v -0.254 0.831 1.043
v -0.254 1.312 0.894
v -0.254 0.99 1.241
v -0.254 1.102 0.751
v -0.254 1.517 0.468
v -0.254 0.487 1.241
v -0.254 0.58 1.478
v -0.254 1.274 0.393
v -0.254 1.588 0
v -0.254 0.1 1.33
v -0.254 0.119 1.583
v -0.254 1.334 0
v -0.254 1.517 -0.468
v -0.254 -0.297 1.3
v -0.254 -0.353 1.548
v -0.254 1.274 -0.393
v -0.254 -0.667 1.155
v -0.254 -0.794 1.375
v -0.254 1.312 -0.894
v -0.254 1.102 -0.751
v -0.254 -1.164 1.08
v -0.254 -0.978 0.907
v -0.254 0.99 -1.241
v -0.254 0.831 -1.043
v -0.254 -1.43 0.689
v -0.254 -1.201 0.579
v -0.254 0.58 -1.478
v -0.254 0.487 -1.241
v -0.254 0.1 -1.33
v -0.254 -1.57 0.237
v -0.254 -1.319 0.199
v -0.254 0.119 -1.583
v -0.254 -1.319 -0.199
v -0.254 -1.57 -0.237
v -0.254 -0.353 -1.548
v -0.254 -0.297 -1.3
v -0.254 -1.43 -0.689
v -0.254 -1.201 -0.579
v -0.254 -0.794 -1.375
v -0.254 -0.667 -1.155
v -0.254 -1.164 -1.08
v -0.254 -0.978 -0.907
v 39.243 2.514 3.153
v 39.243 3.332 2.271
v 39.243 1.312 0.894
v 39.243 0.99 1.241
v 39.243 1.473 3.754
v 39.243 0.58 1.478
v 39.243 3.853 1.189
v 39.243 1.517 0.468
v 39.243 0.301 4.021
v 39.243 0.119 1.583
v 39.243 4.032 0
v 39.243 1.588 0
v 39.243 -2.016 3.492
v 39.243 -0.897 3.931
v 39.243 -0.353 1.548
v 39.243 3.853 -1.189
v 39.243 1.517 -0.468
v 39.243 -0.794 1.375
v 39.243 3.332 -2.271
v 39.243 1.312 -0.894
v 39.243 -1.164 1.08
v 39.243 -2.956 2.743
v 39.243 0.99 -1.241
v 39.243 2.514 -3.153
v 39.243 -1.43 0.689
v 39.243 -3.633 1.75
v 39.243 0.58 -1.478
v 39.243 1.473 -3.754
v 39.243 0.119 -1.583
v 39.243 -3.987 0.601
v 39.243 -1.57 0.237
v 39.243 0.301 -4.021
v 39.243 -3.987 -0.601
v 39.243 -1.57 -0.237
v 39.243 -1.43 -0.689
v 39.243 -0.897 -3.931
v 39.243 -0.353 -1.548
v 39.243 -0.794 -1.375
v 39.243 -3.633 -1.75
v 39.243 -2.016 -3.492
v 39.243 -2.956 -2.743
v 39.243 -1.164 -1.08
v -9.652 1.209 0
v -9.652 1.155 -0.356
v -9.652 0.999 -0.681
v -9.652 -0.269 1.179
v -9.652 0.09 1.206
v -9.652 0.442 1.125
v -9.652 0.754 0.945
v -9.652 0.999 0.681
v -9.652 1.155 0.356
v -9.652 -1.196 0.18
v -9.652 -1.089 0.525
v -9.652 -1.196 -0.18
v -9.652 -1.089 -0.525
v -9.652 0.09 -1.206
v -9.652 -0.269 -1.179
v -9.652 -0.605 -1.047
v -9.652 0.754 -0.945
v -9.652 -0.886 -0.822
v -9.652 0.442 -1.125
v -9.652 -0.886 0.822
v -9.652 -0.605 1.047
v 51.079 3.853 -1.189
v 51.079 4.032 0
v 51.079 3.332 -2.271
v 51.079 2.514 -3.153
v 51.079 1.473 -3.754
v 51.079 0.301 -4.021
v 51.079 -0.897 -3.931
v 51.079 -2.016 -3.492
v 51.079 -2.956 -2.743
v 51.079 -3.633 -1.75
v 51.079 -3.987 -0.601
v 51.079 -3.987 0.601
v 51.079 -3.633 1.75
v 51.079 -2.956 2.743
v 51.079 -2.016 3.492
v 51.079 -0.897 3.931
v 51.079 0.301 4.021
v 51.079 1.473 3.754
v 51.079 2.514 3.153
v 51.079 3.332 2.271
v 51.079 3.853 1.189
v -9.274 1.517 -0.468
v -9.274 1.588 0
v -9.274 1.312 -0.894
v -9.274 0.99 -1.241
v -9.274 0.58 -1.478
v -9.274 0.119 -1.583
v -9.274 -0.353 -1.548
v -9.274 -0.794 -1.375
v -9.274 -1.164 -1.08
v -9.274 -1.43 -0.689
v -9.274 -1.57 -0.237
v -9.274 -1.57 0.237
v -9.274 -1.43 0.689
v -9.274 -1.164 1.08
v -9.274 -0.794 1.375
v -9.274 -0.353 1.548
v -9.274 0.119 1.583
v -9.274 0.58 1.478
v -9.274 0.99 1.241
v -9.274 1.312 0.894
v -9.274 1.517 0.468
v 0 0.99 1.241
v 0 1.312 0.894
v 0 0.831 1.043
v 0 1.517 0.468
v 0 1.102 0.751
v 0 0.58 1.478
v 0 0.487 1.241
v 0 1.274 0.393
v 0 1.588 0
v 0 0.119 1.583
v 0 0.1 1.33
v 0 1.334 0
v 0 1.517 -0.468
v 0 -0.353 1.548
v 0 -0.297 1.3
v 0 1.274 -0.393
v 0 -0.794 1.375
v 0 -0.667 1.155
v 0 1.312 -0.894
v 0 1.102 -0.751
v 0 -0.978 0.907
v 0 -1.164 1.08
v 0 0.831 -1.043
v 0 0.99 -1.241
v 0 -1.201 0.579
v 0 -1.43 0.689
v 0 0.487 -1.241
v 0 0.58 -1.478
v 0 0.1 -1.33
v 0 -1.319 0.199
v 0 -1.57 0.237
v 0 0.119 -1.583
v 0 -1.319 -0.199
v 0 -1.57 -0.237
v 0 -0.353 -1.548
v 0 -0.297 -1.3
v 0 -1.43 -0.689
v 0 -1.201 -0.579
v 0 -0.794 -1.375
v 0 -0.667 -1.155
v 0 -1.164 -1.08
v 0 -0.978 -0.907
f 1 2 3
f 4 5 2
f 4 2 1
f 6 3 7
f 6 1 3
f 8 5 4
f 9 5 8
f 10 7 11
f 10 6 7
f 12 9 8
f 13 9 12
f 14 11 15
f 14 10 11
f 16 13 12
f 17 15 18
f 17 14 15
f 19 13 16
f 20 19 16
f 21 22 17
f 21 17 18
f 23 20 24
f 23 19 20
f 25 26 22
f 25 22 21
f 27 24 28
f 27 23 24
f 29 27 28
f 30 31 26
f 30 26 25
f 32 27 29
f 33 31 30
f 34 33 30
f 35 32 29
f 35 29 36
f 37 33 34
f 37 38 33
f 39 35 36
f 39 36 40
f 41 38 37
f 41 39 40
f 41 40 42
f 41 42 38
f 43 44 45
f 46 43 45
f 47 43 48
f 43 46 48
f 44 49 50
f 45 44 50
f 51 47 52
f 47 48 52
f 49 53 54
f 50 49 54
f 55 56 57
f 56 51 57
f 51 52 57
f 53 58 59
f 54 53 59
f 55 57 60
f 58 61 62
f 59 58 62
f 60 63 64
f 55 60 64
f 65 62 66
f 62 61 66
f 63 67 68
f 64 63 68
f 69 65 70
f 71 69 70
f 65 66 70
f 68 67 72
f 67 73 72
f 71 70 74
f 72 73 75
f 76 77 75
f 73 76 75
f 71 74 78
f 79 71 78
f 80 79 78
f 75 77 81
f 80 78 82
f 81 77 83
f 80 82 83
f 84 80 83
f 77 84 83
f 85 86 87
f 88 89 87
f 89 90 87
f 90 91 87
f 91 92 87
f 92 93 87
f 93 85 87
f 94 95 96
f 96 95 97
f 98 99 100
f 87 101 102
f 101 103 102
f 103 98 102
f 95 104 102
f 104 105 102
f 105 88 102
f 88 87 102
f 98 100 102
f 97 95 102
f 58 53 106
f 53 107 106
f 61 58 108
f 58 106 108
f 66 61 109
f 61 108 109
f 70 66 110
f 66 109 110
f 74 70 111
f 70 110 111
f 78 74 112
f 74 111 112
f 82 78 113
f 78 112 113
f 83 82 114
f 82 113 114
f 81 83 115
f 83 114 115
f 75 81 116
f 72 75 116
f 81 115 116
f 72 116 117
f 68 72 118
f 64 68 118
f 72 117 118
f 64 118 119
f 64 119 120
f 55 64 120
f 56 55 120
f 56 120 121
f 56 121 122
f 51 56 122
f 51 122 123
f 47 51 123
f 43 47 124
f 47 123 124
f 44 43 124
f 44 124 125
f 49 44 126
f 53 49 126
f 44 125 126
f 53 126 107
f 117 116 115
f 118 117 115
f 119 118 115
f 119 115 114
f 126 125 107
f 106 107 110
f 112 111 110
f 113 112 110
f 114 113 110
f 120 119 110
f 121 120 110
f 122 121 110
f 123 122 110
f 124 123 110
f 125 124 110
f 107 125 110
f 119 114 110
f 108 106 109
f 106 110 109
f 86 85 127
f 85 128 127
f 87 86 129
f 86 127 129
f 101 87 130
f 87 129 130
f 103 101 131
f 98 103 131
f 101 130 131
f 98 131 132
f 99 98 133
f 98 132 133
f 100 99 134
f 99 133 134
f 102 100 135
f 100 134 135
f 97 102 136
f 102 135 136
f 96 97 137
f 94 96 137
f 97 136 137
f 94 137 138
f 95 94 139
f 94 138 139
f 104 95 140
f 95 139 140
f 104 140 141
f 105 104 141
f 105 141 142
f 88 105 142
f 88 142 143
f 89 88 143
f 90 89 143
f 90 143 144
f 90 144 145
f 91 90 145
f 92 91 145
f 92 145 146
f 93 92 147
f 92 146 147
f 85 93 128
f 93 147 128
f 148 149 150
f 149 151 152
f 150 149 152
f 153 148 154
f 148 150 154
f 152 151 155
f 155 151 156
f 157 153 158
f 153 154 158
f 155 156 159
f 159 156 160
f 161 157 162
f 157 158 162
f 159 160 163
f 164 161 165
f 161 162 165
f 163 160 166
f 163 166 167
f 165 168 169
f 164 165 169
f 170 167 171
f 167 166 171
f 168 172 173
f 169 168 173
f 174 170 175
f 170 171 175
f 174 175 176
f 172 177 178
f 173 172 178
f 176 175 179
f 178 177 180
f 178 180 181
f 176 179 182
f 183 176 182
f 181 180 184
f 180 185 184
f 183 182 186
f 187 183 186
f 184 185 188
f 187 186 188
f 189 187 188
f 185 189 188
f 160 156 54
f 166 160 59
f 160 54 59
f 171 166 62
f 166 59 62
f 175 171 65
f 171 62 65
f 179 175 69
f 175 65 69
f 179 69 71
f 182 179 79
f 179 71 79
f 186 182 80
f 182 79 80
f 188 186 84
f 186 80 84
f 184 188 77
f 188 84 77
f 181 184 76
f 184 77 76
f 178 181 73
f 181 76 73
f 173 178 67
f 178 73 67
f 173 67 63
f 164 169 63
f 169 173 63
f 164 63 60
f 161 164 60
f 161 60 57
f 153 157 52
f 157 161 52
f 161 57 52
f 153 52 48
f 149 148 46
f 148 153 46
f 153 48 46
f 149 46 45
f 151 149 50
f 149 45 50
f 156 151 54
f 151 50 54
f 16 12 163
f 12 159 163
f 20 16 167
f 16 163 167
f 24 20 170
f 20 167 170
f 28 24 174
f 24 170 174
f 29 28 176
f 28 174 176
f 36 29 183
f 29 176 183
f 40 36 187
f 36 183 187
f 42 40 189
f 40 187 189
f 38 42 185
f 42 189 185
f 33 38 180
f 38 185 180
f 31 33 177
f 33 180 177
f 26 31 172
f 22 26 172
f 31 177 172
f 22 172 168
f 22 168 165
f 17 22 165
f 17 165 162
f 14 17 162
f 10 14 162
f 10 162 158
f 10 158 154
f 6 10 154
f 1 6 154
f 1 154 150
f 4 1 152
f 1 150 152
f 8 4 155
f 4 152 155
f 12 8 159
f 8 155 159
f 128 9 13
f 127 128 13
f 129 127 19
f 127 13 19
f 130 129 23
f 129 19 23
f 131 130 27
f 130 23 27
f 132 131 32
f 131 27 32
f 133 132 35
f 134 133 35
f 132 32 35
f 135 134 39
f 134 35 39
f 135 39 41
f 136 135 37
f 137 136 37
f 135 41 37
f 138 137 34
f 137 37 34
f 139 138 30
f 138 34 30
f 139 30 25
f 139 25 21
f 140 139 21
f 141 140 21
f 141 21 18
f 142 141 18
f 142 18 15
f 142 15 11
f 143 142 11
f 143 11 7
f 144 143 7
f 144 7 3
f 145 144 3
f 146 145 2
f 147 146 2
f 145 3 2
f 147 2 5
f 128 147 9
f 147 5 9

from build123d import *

# Parameters (mm, degrees)
SKETCH3_W = 0.254
SKETCH3_H = 0.508


with BuildPart() as part:
    # Sketch1 → Revolve1 (revolve)
    with BuildSketch(Plane.XY):
        Polygon((0, 0), (0, 1.5875), (39.243, 1.5875), (39.243, 4.03225), (51.0794, 4.03225), (51.0794, 0), align=None)
    revolve(axis=Axis((51.0794, 0, 0), (-1, 0, 0)))

    # Sketch2 → Revolve2 (revolve)
    with BuildSketch(Plane.XY):
        Polygon((-9.652, 0), (-9.652, 1.20904), (-9.27354, 1.5875), (0, 1.5875), (0, 0), align=None)
    revolve(axis=Axis((0, 0, 0), (-1, 0, 0)))

    # Sketch3 → Cut-Revolve1 (revolve, cut)
    with BuildSketch(Plane.XY):
        with Locations((-0.127, 1.5875)):
            Rectangle(SKETCH3_W, SKETCH3_H)
    revolve(axis=Axis((0, 0, 0), (-1, 0, 0)), mode=Mode.SUBTRACT)


solid = part.part
